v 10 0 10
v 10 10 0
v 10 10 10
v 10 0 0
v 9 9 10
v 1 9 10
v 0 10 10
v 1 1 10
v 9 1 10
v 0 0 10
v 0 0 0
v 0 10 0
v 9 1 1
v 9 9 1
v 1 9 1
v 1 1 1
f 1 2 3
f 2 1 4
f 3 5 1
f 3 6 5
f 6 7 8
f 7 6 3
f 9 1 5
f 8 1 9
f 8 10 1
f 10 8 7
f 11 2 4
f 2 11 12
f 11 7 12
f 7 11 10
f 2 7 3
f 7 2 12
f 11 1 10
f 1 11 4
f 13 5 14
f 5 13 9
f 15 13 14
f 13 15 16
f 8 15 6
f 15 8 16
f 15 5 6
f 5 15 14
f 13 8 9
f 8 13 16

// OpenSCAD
// file: ../empty-cube.scad
module emptyCube(x, y, z, thickness) 
{
    difference() 
    {
        // Outer box
        cube([x, y, z]);

        // Inner box
        // To create a box with an open top, the inner box should be offset by 'thickness' in X, Y, and Z.
        // It should extend to the top of the outer cube to remove the top face.
        // Its dimensions will be x - 2*thickness, y - 2*thickness, z
        translate([thickness, thickness, thickness]) 
        {
            cube([x - 2 * thickness, y - 2 * thickness, z]);
        }
    }
}
// main file
use <../empty-cube.scad>

// Example usage:
// For a 10x10x10 cube with 1mm walls
emptyCube(10, 10, 10, 1);
